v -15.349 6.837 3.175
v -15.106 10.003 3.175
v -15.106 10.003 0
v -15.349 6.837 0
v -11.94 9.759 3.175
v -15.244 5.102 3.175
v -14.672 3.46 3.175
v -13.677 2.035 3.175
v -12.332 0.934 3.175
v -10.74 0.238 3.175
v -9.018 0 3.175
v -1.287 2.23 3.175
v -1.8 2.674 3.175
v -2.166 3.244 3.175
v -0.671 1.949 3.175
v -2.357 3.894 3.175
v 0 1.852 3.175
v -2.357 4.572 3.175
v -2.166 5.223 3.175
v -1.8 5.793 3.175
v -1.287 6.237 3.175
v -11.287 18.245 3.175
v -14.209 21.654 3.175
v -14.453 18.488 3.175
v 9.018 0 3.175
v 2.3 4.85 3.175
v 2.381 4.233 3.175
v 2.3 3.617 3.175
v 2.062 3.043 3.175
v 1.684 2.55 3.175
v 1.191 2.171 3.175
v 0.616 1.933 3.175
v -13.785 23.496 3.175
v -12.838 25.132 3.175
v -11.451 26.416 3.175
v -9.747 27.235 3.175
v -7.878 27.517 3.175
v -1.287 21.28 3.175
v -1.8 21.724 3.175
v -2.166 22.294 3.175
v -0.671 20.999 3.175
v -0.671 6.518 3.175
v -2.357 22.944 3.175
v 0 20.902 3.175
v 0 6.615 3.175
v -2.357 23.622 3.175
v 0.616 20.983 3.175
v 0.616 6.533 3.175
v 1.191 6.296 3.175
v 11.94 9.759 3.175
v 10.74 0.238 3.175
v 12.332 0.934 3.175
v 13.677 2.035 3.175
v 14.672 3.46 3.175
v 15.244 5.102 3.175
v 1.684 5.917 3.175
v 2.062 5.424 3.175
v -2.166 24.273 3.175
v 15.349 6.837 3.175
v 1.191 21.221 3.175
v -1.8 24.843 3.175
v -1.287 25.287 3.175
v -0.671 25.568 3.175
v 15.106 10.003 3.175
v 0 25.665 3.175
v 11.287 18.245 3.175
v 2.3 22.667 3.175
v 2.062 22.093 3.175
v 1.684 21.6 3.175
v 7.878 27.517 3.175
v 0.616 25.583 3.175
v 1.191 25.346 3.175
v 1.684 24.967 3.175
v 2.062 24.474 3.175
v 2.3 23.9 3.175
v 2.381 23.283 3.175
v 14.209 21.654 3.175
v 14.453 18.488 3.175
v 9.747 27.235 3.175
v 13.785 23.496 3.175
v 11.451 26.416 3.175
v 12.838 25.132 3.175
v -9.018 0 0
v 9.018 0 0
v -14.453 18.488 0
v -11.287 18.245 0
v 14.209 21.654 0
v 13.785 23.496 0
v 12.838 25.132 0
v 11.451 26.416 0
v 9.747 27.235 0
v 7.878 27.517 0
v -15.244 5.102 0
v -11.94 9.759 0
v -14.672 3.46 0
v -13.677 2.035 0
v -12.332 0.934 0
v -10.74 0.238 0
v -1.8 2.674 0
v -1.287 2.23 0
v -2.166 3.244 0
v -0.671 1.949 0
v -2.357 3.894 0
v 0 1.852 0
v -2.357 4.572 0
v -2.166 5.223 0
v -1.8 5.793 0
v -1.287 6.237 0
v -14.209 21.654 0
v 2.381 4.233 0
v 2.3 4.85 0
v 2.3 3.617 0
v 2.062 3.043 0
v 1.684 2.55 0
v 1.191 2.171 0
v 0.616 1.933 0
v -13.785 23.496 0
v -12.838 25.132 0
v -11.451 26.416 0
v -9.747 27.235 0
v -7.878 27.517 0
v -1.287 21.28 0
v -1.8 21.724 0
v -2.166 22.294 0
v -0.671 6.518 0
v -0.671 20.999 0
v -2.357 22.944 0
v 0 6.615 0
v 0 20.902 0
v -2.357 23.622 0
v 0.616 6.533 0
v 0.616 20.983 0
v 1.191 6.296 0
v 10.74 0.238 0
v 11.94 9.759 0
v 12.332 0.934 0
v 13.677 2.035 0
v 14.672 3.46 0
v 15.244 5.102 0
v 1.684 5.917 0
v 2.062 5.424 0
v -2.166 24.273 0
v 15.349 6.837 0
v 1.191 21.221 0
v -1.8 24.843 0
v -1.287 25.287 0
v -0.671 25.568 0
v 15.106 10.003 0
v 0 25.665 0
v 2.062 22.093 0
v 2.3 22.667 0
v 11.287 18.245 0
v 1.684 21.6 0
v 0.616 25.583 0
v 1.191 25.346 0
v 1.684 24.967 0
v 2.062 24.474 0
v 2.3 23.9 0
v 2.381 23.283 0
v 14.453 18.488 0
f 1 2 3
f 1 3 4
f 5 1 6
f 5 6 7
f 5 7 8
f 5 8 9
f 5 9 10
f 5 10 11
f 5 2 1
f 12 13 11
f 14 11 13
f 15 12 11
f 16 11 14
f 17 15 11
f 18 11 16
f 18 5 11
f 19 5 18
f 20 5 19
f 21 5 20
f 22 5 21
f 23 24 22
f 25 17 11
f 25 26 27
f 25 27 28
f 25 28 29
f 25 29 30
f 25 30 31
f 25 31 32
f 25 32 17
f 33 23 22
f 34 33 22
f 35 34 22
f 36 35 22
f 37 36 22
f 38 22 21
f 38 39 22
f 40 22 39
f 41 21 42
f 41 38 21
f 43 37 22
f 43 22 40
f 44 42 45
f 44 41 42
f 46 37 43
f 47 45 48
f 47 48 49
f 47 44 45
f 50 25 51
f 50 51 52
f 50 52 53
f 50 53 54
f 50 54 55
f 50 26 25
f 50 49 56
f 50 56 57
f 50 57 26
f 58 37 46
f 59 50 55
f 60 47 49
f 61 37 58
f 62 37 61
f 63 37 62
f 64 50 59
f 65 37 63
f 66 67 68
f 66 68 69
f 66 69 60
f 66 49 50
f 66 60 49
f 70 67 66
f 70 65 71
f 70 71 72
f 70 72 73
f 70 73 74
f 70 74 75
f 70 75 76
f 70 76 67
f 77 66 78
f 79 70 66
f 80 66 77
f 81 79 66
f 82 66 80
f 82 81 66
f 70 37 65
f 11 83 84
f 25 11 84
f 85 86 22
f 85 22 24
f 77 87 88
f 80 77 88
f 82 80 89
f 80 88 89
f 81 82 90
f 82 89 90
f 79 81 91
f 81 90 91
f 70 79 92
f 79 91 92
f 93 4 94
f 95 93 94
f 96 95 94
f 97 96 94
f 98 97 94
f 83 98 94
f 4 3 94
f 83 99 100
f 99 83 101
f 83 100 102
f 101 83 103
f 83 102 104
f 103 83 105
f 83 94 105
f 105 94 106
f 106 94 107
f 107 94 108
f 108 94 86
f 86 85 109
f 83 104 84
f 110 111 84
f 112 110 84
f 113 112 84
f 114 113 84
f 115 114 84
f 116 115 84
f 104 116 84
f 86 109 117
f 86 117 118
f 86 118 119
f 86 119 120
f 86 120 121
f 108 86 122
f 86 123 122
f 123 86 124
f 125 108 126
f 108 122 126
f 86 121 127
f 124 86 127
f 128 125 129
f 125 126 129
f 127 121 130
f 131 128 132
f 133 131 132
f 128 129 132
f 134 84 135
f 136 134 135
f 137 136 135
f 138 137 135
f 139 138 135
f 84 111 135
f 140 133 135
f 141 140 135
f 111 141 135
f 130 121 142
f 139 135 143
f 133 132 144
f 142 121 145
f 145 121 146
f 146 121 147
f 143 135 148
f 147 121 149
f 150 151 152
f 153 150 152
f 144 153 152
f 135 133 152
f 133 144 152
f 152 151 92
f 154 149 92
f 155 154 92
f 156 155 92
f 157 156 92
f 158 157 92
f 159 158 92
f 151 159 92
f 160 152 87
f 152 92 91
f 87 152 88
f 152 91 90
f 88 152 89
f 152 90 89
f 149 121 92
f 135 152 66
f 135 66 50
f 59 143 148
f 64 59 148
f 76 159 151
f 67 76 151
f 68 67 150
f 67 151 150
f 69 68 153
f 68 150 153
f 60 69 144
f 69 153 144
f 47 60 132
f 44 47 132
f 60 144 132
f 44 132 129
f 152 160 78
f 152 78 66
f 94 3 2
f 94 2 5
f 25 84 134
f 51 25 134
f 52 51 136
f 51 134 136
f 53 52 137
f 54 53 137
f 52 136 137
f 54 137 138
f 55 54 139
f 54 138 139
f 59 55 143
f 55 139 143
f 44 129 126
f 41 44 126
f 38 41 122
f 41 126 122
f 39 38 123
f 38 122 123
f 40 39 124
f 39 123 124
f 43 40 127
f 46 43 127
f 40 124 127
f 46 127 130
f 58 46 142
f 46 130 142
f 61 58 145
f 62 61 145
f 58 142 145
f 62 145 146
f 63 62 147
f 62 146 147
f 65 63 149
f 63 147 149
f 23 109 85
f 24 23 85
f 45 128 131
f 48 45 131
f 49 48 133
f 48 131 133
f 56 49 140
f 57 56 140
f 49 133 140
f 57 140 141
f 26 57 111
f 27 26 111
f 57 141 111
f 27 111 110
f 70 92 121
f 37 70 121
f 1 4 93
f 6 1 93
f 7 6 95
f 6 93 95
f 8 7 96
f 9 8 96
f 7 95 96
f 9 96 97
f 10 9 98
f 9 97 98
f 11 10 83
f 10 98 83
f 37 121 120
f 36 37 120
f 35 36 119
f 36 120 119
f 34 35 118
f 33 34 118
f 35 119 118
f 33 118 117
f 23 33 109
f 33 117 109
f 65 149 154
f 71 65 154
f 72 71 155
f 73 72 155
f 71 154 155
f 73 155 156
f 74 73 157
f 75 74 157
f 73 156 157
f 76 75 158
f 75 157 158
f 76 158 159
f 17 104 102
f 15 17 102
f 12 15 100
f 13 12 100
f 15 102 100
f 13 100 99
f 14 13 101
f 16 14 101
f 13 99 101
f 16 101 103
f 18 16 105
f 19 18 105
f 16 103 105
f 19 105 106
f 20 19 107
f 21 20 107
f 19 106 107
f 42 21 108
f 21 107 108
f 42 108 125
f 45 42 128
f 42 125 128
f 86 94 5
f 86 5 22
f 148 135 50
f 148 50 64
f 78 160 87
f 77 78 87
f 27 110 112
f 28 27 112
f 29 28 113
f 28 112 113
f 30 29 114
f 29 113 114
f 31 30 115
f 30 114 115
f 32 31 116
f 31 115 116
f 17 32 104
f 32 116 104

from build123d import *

# Parameters (mm, degrees)
BOSS_EXTRUDE1_DEPTH = 3.175
CAVITY1_DEPTH       = 3.175


# Read off the part's stored shape, not the designer's step: Cavity1
with BuildPart() as part:
    # Sketch1 → Boss-Extrude1 (new body)
    with BuildSketch(Plane.XY):
        with BuildLine():
            Line((-9.017779189, 0), (0, 0))
            Line((0, 0), (0, 1.852083291))
            ThreePointArc((0, 1.852083291), (-2.38125, 4.233333291), (0, 6.614583291))
            Line((0, 6.614583291), (0, 20.902083291))
            ThreePointArc((0, 20.902083291), (-2.38125, 23.283333291), (0, 25.664583291))
            Line((0, 25.664583291), (0, 27.516666667))
            Line((0, 27.516666667), (-7.878035599, 27.516666667))
            ThreePointArc((-7.878035599, 27.516666667), (-12.19254052, 25.825802562), (-14.209331582, 21.653689435))
            Line((-14.209331582, 21.653689435), (-15.349075172, 6.837022768))
            ThreePointArc((-15.349075172, 6.837022768), (-13.676915084, 2.035495079), (-9.017779189, 0))
        make_face()
        with BuildLine():
            Line((0, 1.852083291), (0, 0))
            Line((0, 0), (9.017779189, 0))
            ThreePointArc((9.017779189, 0), (13.676915084, 2.035495079), (15.349075172, 6.837022768))
            Line((15.349075172, 6.837022768), (14.209331582, 21.653689435))
            ThreePointArc((14.209331582, 21.653689435), (12.19254052, 25.825802562), (7.878035599, 27.516666667))
            Line((7.878035599, 27.516666667), (0, 27.516666667))
            Line((0, 27.516666667), (0, 25.664583291))
            ThreePointArc((0, 25.664583291), (1.683798023, 24.967131314), (2.38125, 23.283333291))
            ThreePointArc((2.38125, 23.283333291), (1.683798023, 21.599535268), (0, 20.902083291))
            Line((0, 20.902083291), (0, 6.614583291))
            ThreePointArc((0, 6.614583291), (1.683798023, 5.917131314), (2.38125, 4.233333291))
            ThreePointArc((2.38125, 4.233333291), (1.683798023, 2.549535268), (0, 1.852083291))
        make_face()
    extrude(amount=BOSS_EXTRUDE1_DEPTH)

    # Cavity1 outline → Cavity1 (cut)
    with BuildSketch(Plane.XY):
        Polygon((11.287194974, 18.244530059), (11.939915796, 9.759159375), (15.105563788, 10.002670759), (14.452842966, 18.488041443), align=None)
        Polygon((-15.105563788, 10.002670759), (-11.939915796, 9.759159375), (-11.287194974, 18.244530059), (-14.452842966, 18.488041443), align=None)
    extrude(amount=CAVITY1_DEPTH, mode=Mode.SUBTRACT)


solid = part.part
